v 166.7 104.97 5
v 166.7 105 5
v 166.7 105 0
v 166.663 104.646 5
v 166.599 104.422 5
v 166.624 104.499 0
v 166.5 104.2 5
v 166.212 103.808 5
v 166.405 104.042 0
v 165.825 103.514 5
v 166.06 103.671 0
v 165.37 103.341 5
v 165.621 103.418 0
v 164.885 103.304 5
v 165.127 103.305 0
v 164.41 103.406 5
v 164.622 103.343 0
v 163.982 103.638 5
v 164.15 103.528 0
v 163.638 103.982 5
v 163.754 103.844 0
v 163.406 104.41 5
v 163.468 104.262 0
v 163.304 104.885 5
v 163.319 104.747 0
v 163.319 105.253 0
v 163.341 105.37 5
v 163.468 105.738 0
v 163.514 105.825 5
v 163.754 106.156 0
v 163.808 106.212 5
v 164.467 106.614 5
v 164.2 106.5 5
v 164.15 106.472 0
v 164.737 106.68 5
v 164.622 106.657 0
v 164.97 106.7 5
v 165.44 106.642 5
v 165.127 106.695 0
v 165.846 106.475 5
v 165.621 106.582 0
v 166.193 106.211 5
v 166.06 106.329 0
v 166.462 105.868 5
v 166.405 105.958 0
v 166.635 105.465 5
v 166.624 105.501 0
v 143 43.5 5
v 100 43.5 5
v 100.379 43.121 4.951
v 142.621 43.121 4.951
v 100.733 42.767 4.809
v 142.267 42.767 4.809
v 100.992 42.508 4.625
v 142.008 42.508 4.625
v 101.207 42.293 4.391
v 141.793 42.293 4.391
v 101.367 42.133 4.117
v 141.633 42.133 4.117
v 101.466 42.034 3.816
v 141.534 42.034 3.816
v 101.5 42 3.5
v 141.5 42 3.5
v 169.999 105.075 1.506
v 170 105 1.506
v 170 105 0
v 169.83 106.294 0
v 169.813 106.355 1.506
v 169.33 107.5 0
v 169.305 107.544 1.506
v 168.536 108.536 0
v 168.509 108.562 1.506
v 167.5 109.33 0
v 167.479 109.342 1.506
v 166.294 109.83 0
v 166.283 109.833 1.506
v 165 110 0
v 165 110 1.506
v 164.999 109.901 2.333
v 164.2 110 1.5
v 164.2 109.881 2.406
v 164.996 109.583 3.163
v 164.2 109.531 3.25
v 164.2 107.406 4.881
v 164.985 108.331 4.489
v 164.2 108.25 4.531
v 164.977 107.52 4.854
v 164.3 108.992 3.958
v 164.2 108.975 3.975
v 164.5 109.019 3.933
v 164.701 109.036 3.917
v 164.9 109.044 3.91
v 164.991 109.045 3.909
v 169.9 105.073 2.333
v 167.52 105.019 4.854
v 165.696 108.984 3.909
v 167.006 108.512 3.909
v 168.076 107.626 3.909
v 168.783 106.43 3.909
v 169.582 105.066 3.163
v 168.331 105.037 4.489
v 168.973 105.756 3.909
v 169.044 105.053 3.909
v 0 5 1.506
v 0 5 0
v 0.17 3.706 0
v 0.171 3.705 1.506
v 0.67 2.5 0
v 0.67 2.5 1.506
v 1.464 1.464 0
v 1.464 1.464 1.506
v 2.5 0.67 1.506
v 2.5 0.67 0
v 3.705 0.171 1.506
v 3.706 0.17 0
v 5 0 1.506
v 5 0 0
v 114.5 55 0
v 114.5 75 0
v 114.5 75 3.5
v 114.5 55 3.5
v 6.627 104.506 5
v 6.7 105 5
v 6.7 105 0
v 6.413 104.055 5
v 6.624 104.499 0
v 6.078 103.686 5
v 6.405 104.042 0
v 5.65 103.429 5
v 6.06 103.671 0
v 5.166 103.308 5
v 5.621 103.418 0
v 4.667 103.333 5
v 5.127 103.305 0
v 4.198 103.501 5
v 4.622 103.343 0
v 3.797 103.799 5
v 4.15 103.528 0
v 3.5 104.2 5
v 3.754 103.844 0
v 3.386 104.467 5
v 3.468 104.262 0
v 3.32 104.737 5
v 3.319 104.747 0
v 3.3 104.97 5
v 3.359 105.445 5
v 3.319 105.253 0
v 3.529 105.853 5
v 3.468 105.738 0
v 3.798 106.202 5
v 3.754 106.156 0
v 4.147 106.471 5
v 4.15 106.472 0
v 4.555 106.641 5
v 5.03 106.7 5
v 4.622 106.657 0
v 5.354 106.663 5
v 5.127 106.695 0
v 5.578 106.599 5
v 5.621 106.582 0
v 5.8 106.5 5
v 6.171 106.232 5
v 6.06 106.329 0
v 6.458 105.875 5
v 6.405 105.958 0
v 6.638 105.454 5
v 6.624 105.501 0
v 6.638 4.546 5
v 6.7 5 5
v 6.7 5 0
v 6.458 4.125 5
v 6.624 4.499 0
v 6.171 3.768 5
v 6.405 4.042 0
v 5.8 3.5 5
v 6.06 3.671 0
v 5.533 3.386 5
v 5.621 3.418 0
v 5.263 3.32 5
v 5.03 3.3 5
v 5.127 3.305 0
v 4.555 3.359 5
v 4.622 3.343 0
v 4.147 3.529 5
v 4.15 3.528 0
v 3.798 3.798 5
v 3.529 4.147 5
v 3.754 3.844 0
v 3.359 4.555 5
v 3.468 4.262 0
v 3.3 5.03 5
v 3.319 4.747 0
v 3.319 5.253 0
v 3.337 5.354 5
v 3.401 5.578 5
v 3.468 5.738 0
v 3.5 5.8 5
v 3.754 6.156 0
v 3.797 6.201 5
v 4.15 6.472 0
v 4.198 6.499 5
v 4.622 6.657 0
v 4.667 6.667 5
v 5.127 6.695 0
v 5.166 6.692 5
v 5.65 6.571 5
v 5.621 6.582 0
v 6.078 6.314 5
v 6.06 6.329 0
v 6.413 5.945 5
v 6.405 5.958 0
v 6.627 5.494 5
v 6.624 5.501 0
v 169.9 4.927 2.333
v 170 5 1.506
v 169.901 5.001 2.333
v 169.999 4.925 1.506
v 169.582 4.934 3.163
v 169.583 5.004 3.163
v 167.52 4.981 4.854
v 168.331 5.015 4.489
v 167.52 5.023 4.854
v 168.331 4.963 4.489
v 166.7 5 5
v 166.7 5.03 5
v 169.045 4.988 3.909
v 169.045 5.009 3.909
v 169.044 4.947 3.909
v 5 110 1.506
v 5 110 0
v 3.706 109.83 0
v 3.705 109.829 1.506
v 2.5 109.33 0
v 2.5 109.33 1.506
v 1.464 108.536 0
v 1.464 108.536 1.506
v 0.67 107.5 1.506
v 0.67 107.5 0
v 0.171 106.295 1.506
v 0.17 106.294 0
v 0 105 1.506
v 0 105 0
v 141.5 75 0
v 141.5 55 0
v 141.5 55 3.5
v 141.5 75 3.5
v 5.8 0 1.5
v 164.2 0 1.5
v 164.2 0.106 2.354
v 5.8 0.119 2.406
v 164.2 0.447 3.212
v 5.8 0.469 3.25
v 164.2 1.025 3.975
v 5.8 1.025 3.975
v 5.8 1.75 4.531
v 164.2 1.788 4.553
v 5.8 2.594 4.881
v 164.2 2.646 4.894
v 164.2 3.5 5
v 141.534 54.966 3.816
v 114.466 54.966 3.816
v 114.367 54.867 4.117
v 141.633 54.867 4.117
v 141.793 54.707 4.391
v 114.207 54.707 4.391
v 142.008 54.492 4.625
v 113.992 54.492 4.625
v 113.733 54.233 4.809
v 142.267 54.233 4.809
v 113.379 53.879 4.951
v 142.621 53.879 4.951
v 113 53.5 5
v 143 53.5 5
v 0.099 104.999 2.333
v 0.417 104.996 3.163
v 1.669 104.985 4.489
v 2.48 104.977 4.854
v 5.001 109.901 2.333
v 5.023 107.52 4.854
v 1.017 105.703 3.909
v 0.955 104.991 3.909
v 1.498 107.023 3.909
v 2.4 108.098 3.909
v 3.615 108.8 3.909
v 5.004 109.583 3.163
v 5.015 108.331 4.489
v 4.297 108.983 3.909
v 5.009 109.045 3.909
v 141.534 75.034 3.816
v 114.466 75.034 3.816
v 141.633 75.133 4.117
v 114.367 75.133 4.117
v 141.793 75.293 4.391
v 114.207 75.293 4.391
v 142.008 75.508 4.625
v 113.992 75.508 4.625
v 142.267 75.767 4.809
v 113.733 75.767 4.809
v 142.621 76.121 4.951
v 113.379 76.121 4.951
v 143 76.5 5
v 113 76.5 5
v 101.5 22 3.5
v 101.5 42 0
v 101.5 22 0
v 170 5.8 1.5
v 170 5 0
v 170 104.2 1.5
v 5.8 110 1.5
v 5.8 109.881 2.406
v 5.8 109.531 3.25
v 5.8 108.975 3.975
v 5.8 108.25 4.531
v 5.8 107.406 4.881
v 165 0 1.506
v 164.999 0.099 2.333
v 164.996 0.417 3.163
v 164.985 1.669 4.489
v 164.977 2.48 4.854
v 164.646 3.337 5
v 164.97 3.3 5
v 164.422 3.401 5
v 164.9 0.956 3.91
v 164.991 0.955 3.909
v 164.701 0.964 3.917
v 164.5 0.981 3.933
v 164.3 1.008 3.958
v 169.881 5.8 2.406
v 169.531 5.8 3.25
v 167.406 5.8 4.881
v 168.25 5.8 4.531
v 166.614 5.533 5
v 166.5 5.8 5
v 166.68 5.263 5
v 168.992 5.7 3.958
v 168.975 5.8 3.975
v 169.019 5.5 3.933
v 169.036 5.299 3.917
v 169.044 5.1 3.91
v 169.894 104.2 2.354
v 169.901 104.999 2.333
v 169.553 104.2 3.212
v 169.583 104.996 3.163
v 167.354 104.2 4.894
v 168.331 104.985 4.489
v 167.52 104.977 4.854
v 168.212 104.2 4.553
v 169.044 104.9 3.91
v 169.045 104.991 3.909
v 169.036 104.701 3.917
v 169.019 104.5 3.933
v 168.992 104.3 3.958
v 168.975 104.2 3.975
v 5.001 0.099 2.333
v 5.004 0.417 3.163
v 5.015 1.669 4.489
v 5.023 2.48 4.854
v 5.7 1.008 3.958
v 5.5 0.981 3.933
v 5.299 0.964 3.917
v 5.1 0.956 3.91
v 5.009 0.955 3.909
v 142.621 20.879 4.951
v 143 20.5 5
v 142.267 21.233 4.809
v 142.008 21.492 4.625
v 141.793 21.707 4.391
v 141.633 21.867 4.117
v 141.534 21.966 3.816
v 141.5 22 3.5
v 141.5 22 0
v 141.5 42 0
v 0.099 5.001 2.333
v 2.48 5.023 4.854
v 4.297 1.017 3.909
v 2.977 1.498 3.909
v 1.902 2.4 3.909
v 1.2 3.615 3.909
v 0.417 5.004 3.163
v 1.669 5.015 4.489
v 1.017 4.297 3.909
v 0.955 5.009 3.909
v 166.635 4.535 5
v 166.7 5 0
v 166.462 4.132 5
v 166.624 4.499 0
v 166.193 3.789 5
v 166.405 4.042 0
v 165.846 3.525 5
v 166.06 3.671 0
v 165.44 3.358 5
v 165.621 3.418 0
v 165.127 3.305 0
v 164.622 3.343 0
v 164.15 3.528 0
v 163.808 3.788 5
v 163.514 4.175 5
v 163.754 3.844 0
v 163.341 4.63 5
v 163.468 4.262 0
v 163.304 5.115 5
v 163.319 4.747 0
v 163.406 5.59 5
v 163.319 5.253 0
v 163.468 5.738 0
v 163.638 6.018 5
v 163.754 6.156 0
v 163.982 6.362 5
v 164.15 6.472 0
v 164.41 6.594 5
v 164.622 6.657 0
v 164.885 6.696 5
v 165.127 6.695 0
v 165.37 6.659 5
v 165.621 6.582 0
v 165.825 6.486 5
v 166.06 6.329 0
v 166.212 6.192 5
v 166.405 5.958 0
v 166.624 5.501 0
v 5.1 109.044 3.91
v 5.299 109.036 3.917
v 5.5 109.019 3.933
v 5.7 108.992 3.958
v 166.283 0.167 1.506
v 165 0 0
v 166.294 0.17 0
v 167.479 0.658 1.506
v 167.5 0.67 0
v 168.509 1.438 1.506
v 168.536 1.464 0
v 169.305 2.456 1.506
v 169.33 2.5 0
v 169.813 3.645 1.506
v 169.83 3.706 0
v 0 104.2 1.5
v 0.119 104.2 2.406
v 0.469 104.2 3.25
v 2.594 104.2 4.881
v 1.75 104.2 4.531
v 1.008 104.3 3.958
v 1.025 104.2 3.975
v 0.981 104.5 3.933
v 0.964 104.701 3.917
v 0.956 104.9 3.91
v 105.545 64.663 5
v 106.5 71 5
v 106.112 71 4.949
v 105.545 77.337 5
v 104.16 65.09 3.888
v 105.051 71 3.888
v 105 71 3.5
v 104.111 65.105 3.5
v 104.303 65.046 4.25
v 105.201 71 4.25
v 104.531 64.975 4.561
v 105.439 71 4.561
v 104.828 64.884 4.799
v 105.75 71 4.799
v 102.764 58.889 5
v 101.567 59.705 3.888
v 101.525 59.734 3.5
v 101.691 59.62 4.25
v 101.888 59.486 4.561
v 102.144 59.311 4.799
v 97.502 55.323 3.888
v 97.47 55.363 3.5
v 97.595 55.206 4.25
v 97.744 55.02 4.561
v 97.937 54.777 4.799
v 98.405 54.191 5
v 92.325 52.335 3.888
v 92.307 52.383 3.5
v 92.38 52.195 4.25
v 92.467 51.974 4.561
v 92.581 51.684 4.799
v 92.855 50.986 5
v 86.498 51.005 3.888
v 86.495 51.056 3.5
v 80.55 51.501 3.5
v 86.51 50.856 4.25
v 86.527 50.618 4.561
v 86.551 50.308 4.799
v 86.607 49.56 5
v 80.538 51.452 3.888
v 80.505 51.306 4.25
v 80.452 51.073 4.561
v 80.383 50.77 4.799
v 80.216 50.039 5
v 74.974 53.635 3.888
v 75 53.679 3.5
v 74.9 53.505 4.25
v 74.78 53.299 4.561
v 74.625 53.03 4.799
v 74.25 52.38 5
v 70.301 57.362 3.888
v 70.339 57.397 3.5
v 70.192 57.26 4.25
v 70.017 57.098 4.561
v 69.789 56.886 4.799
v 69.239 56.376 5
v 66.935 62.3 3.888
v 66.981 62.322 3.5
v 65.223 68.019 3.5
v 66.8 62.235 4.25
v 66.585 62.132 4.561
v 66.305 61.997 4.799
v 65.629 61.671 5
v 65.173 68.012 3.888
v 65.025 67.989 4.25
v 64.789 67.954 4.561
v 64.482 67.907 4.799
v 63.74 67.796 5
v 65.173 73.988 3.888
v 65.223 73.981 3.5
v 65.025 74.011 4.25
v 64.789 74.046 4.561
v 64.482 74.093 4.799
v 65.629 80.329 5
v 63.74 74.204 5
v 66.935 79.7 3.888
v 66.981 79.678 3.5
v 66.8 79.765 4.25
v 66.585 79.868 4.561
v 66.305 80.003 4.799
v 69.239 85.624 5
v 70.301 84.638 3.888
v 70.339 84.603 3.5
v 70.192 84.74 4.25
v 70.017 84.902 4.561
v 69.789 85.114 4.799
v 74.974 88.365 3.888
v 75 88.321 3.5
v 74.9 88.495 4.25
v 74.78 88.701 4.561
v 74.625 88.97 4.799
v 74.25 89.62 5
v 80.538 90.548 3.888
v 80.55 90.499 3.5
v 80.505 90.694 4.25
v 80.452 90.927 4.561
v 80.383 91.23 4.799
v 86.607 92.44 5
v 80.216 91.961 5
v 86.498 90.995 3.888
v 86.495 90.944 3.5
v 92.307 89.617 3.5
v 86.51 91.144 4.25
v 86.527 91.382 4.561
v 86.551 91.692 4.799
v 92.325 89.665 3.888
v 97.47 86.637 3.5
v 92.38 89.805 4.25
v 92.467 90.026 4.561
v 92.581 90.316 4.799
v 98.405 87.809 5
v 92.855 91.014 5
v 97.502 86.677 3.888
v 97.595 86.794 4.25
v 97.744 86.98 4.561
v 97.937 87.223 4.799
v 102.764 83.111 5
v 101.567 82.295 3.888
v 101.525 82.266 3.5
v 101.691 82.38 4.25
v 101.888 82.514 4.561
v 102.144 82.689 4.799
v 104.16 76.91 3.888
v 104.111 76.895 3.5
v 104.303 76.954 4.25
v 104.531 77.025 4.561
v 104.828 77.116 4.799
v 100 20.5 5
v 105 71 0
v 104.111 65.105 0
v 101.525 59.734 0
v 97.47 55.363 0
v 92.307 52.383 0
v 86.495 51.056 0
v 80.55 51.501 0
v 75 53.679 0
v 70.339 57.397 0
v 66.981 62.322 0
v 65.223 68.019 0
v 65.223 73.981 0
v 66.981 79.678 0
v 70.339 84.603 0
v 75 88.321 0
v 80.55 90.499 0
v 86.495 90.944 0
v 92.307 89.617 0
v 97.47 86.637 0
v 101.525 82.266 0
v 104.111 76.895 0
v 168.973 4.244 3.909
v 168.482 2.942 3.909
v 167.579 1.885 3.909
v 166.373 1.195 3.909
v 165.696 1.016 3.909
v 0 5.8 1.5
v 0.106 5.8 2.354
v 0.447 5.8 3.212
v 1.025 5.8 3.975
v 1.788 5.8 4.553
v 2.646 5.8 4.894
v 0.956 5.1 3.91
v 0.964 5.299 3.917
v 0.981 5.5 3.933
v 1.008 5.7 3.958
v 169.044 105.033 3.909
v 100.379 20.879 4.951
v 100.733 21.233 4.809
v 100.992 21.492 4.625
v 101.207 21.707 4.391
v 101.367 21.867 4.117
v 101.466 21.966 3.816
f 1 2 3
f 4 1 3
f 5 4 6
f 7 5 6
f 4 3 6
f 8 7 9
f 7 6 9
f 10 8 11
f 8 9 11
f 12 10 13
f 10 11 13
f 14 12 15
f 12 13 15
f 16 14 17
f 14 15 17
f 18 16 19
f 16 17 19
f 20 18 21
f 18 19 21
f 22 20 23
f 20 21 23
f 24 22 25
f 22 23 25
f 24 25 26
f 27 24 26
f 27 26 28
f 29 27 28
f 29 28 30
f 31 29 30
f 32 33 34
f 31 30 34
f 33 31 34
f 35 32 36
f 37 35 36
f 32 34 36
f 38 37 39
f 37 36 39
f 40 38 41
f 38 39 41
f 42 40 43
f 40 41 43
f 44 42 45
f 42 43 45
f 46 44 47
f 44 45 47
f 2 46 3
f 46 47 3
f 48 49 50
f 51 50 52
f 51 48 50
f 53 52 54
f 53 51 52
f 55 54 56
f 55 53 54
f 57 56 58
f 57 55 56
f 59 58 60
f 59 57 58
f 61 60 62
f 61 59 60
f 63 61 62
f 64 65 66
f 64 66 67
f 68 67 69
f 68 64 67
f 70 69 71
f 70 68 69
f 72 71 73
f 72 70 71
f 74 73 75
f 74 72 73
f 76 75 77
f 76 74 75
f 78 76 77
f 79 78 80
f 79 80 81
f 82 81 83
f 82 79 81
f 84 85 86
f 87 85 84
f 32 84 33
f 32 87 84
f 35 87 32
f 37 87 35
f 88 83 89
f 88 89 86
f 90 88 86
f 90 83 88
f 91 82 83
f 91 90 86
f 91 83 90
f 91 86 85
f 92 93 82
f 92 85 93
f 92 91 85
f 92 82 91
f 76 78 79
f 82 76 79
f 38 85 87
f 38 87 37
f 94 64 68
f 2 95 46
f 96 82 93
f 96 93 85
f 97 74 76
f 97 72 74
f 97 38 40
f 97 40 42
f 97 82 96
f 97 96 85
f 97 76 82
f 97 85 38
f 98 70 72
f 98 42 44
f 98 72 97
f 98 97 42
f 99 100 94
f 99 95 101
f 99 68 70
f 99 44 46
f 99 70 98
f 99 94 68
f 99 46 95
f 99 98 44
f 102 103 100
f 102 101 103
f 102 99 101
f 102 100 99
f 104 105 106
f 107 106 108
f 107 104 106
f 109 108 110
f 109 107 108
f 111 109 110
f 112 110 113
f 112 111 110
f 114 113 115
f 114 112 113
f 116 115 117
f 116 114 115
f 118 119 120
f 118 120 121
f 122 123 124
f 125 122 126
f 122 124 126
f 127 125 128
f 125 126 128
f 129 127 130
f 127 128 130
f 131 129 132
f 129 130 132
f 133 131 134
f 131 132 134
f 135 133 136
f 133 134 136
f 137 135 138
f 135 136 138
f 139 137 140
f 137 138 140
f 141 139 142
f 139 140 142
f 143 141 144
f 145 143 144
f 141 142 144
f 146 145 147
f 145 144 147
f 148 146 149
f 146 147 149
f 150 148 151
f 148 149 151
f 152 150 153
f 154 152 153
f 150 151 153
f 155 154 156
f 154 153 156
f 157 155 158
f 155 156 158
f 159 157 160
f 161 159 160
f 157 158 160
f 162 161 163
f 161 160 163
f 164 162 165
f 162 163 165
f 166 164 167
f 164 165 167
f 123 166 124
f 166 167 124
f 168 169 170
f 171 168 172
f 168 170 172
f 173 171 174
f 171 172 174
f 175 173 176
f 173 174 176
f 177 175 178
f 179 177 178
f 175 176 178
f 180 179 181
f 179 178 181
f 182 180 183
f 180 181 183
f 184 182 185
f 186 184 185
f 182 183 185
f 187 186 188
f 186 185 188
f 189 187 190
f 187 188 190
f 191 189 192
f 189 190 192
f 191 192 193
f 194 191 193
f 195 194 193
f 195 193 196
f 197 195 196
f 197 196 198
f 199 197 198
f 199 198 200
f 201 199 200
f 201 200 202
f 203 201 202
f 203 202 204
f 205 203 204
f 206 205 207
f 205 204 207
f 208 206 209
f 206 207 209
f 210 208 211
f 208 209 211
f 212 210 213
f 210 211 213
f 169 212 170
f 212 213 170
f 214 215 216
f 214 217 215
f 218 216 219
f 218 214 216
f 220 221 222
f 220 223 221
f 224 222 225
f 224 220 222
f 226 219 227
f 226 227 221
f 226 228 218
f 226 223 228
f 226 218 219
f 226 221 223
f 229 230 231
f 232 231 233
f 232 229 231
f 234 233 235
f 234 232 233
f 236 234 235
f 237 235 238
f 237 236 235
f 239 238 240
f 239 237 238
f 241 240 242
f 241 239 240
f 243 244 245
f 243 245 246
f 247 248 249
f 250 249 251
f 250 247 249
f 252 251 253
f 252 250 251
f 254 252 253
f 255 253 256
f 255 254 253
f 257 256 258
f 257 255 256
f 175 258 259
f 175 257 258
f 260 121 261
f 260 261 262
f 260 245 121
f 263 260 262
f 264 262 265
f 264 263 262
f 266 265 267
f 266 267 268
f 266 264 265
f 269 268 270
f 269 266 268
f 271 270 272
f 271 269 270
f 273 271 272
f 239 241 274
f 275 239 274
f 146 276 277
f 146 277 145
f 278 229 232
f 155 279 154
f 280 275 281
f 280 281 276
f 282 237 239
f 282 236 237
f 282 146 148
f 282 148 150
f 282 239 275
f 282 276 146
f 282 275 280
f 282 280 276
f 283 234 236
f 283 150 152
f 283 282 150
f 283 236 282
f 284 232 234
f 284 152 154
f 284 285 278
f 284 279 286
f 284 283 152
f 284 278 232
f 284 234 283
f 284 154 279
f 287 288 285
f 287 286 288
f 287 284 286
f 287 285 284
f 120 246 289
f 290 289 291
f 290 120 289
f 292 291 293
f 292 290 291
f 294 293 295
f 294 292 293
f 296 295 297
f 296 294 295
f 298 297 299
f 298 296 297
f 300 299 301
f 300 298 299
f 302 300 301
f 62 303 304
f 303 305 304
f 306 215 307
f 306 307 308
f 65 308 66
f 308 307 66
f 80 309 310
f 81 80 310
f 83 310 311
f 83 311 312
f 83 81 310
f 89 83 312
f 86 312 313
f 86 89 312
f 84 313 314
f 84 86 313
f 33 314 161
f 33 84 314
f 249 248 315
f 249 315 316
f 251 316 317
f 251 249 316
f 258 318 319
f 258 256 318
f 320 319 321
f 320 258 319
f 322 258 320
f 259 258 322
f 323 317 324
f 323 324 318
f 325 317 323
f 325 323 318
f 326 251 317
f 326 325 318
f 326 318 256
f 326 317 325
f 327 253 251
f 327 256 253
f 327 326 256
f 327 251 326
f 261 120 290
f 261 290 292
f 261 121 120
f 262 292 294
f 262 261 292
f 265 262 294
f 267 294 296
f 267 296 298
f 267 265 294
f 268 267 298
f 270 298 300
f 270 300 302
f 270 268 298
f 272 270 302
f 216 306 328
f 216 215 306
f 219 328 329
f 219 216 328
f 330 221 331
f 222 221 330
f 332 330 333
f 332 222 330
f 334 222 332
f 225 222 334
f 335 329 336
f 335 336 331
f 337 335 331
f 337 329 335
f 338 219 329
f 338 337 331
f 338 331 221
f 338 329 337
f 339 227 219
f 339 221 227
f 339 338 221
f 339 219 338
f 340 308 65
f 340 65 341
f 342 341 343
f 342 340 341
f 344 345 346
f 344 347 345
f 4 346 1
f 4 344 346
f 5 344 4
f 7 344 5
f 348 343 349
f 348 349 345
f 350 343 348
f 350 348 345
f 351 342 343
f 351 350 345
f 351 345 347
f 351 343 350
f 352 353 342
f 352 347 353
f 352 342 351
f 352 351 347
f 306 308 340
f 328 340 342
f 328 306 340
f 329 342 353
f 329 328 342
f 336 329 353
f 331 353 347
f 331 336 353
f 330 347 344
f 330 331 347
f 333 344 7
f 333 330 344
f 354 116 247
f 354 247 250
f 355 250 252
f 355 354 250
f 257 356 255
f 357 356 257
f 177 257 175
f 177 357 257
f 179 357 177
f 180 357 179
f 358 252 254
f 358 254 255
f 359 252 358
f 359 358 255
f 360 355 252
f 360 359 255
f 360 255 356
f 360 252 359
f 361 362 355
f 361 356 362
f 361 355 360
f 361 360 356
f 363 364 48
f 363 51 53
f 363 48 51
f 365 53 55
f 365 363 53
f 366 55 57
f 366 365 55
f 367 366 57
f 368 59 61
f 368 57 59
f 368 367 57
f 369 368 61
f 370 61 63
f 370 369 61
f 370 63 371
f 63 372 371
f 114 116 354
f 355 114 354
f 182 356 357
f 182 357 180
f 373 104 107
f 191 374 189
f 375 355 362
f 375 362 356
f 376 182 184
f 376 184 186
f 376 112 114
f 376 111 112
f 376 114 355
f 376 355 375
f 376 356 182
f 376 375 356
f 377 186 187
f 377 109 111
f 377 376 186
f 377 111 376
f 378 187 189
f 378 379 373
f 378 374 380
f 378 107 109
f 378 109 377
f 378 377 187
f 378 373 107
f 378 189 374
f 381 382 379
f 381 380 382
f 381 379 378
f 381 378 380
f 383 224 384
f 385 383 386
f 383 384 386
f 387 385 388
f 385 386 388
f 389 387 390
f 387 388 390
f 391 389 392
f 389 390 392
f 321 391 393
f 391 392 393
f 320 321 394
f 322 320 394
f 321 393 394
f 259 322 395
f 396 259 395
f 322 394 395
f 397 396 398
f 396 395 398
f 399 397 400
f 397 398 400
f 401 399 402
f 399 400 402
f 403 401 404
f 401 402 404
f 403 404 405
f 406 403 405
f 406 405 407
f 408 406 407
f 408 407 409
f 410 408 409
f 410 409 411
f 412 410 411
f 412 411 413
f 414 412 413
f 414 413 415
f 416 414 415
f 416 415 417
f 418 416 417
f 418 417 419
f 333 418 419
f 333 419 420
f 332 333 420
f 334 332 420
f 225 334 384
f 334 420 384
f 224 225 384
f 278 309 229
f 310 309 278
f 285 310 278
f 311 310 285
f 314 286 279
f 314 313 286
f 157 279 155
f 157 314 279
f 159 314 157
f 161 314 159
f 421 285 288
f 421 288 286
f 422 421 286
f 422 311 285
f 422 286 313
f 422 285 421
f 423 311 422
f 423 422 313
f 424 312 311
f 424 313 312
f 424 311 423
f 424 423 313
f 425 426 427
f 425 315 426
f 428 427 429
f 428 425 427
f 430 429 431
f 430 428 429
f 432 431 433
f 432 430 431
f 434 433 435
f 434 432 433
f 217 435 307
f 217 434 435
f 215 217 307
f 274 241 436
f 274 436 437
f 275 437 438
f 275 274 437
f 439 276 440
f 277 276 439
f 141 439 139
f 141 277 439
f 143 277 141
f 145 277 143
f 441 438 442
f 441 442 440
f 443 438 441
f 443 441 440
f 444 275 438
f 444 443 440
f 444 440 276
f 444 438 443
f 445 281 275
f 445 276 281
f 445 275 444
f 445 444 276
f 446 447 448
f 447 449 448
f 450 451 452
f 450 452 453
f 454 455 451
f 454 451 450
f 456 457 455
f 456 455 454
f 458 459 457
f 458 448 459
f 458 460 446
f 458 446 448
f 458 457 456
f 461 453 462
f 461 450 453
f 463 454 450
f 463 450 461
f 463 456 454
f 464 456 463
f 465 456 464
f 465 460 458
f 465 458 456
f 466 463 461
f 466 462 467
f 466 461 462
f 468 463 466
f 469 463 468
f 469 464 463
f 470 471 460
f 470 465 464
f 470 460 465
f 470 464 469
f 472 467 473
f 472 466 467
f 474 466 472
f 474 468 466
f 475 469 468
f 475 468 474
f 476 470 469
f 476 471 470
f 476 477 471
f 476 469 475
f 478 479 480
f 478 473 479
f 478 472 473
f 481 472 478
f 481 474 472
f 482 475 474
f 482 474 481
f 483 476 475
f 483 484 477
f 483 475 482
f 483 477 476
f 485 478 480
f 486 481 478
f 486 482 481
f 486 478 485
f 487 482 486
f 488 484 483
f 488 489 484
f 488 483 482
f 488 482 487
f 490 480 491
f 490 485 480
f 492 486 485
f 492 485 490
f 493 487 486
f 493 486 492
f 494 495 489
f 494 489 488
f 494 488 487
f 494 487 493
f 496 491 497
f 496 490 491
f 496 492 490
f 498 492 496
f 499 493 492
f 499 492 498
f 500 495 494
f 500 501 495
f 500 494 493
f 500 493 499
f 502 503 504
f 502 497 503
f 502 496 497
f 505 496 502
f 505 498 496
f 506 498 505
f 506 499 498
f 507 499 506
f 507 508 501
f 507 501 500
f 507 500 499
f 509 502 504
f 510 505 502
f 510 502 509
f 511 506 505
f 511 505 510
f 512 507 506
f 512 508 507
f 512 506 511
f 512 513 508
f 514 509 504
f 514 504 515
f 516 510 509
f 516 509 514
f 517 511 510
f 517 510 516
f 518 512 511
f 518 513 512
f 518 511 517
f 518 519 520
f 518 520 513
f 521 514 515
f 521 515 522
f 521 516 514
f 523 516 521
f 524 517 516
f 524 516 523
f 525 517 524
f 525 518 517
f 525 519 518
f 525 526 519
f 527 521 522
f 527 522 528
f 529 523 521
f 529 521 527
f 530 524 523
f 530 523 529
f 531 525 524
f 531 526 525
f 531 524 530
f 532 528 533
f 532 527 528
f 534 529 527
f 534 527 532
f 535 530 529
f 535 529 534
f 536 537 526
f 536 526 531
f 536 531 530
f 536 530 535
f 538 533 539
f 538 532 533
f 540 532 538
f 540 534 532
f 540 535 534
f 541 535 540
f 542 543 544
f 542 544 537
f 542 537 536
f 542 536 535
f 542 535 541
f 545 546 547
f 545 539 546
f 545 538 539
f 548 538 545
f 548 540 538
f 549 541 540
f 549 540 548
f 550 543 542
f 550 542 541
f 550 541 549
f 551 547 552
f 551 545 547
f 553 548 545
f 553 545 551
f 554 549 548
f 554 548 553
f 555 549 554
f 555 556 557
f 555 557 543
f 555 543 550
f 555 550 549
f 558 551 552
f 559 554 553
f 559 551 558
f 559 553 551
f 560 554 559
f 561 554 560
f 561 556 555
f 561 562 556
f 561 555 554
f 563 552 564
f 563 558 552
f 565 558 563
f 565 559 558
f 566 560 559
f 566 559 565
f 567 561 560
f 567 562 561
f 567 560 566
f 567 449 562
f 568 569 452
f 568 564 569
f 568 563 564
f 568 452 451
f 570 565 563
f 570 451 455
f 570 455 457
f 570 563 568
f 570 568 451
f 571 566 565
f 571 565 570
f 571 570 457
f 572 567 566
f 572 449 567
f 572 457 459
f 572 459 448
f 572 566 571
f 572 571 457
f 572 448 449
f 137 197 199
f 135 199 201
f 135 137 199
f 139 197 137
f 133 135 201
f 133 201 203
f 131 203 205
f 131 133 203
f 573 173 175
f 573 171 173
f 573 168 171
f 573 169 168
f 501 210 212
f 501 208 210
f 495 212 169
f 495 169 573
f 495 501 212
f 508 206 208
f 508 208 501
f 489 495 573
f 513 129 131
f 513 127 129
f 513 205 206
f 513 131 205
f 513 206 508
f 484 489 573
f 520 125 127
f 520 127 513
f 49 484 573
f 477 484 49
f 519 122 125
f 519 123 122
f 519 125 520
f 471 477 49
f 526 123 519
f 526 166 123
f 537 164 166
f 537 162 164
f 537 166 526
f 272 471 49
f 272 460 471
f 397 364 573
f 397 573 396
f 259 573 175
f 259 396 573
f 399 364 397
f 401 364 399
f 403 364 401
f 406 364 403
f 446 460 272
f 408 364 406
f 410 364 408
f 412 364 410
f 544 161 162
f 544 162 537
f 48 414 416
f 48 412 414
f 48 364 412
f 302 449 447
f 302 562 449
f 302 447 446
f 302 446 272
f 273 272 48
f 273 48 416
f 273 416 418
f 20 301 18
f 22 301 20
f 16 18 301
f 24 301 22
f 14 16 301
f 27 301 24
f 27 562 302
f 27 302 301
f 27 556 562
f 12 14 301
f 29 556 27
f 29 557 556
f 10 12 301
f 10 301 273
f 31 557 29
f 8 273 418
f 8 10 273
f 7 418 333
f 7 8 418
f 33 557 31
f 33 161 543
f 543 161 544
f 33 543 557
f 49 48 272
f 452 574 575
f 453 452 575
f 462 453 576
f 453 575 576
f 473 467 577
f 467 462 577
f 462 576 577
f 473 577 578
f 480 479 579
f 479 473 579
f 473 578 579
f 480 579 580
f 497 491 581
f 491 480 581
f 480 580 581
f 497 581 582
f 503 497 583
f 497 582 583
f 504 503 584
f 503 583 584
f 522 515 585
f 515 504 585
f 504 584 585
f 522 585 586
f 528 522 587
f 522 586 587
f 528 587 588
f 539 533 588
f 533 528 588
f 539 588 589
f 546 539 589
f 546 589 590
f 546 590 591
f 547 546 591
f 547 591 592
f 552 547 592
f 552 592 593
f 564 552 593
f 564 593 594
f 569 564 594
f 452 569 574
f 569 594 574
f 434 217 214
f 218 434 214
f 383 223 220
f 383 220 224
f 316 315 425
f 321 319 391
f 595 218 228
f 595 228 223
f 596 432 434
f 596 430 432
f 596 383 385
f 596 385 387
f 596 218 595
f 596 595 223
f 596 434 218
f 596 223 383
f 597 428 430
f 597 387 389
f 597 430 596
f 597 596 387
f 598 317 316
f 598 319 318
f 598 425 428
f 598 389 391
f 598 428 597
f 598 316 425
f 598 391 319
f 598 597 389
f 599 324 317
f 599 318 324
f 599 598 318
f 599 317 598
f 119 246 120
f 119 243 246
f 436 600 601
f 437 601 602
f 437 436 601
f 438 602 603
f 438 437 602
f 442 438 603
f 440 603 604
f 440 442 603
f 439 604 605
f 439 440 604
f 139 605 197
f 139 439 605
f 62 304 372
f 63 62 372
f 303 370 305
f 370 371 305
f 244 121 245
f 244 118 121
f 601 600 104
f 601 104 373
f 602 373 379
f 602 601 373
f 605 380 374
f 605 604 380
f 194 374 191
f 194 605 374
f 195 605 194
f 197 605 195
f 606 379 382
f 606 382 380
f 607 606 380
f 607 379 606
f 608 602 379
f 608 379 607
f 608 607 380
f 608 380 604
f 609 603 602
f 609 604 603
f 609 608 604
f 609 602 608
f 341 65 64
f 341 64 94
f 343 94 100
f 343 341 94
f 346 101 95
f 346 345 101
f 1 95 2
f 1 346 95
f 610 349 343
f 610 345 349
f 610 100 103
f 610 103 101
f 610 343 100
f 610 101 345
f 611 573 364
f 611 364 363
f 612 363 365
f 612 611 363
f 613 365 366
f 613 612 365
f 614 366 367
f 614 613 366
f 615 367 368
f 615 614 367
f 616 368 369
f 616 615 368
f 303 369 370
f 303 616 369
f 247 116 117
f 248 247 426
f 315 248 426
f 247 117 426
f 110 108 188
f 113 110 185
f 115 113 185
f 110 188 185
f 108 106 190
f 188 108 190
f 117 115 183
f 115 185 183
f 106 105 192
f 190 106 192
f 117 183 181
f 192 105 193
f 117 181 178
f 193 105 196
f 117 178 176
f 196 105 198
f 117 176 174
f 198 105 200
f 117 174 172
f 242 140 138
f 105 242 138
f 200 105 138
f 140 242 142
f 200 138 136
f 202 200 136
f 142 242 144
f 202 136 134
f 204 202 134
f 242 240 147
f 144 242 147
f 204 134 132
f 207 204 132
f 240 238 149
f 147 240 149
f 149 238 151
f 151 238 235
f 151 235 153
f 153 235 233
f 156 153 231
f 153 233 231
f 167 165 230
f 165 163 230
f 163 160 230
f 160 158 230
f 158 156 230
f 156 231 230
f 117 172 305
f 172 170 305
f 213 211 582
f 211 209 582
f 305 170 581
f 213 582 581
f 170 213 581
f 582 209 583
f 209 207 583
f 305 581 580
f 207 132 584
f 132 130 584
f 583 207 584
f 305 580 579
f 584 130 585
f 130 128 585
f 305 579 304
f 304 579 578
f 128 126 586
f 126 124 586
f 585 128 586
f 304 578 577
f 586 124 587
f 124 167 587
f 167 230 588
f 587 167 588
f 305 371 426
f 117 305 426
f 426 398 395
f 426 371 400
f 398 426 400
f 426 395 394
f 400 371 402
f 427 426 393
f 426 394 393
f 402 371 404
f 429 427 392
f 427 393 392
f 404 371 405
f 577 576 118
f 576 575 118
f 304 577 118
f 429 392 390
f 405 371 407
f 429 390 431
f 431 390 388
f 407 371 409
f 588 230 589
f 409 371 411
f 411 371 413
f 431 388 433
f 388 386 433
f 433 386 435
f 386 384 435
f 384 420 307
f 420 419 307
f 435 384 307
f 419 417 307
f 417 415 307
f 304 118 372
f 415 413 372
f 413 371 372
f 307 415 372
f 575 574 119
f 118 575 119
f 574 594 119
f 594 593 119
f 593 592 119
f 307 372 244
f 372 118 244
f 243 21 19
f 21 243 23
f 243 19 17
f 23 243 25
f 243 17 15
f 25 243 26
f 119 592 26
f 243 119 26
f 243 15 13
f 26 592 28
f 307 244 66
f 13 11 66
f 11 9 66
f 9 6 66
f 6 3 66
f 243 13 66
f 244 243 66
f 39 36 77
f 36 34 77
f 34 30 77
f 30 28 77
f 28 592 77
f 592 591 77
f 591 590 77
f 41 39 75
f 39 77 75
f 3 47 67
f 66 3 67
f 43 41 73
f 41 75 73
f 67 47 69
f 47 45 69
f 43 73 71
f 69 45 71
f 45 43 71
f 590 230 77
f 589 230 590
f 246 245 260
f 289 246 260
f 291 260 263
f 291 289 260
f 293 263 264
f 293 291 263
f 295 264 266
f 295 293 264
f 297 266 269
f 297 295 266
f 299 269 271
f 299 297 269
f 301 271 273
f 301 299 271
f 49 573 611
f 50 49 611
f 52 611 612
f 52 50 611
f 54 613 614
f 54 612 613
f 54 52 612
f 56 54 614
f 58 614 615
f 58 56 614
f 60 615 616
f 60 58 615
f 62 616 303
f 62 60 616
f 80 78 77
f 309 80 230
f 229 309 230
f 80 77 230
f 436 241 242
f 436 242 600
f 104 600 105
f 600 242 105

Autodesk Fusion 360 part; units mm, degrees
sketch "Sketch1" plane through (0, 0, 0) normal (0, 0, 1) x (1, 0, 0) in component "FloppySquare Top (1)"
  line L0 (0, 0) -> (170, 0)
  line L1 (170, 0) -> (170, 110)
  line L2 (170, 110) -> (0, 110)
  line L3 (0, 110) -> (0, 0)
  circle A0 centre (5, 105) radius 1.7
  circle A1 centre (5, 5) radius 1.7
  circle A2 centre (165, 105) radius 1.7
  circle A3 centre (165, 5) radius 1.7
  line L4 (141.5, 75) -> (114.5, 75)
  line L5 (114.5, 75) -> (114.5, 55)
  line L6 (114.5, 55) -> (141.5, 55)
  line L7 (141.5, 55) -> (141.5, 75)
  circle A4 centre (85, 71) radius 20
  line L8 (141.5, 22) -> (101.5, 22)
  line L9 (101.5, 22) -> (101.5, 42)
  line L10 (101.5, 42) -> (141.5, 42)
  line L11 (141.5, 42) -> (141.5, 22)
  dimension "d1" = 170
  dimension "d2" = 110
  dimension "d3" = 3.4
  dimension "d4" = 3.4
  dimension "d5" = 3.4
  dimension "d6" = 3.4
  dimension "d7" = 5
  dimension "d8" = 5
  dimension "d9" = 5
  dimension "d10" = 5
  dimension "d11" = 5
  dimension "d12" = 5
  dimension "d13" = 5
  dimension "d14" = 5
  dimension "d15" = 27
  dimension "d16" = 20
  dimension "d17" = 28.5
  dimension "d18" = 35
  dimension "d19" = 40
  dimension "d20" = 85
  dimension "d21" = 39
  dimension "d22" = 40
  dimension "d23" = 20
  dimension "d24" = 22
  dimension "d25" = 28.5
extrude "Extrude1" add sketch "Sketch1" along normal blind 5 in component "FloppySquare Top (1)"
fillet "Fillet1" radius 5 4 edges at (0, 110, 2.5) (0, 0, 2.5) (170, 0, 2.5) (170, 110, 2.5) in component "FloppySquare Top (1)"
fillet "Fillet2" radius 3.5 8 edges at (1.4645, 108.5355, 5) (0, 55, 5) (1.4645, 1.4645, 5) (85, 0, 5) (168.5355, 1.4645, 5) (170, 55, 5) (168.5355, 108.5355, 5) (85, 110, 5) in component "FloppySquare Top (1)"
fillet "Fillet3" radius 1.5 9 edges at (141.5, 65, 5) (128, 55, 5) (114.5, 65, 5) (128, 75, 5) (121.5, 42, 5) (141.5, 32, 5) (101.5, 32, 5) (121.5, 22, 5) (66.3535, 78.2323, 5) in component "FloppySquare Top (1)"
component "FloppySquare Top (1)" placed x (1, 0, 0) y (0, 1, 0) z (0, 0, 1) at (0, 0, 0)
